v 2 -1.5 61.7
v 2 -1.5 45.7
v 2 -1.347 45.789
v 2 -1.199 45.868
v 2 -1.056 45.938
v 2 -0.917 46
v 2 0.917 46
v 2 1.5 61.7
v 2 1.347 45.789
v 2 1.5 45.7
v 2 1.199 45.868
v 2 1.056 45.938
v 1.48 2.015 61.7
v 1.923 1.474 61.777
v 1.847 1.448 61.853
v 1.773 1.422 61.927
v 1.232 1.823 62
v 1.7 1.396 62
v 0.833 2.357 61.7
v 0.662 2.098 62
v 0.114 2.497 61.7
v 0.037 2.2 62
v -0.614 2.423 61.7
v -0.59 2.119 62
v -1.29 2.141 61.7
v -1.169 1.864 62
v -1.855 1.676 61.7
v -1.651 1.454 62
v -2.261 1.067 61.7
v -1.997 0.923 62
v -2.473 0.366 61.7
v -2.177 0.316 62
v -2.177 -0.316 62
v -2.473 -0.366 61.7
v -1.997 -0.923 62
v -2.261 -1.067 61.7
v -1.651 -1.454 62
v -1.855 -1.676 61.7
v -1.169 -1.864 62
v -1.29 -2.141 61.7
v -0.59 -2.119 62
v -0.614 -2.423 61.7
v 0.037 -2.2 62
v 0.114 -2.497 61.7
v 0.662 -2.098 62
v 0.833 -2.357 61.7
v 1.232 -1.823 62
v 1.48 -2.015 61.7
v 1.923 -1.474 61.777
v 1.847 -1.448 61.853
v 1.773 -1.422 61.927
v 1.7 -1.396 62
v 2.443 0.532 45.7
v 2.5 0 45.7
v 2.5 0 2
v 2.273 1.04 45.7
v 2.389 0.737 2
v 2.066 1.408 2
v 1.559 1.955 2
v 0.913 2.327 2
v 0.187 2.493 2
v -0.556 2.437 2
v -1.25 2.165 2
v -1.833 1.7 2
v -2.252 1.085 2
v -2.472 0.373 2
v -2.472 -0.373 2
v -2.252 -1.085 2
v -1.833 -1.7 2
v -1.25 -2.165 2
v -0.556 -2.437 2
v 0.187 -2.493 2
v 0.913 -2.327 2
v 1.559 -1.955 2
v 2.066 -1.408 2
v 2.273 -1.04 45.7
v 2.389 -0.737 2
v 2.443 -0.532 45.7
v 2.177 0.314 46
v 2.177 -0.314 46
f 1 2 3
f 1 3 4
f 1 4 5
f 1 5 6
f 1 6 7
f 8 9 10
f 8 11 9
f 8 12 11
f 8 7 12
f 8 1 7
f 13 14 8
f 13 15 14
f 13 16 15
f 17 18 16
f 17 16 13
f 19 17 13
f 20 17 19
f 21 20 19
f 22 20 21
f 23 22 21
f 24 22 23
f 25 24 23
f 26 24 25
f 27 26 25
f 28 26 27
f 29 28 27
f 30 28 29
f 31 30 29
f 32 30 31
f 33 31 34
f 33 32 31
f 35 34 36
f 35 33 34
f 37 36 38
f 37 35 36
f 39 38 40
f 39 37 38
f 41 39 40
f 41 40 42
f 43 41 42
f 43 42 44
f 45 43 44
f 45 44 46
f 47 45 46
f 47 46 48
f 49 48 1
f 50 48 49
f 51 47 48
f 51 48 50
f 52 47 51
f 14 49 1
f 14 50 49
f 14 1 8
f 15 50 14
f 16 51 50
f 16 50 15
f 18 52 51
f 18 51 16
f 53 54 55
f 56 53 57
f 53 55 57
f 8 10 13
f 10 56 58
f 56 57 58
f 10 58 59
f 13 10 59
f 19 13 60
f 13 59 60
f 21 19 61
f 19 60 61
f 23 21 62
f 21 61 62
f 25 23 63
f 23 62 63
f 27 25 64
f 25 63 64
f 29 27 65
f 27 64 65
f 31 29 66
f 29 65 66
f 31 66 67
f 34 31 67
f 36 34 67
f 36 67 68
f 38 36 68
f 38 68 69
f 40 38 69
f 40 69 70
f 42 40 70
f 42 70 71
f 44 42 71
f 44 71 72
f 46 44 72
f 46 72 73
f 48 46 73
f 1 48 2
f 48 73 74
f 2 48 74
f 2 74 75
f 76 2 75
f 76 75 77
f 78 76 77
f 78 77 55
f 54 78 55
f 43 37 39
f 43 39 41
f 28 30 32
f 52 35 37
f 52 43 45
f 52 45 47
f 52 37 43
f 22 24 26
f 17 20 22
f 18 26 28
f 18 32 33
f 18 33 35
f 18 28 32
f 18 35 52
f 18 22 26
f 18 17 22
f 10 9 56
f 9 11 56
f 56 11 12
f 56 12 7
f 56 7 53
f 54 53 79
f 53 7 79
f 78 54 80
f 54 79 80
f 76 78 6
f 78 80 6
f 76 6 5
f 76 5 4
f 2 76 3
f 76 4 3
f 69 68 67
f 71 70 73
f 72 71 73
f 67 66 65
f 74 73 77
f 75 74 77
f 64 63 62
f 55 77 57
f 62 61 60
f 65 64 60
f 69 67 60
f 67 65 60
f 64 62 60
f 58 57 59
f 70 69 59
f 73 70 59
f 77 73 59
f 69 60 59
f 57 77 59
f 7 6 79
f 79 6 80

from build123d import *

# Parameters (mm, degrees)
SKETCH070_R     = 2.5
PAD030_DEPTH    = 60
SKETCH066_W     = 4
SKETCH066_H     = 4
POCKET022_DEPTH = 16
CHAMFER016_SIZE = 0.3


with BuildPart() as part:
    # Sketch070 → Pad030 (new body)
    with BuildSketch(Plane.XY):
        Circle(SKETCH070_R)
    extrude(amount=PAD030_DEPTH)

    # Sketch066 (on Face3 of Pad030) → Pocket022 (cut)
    with BuildSketch(Plane.XY.offset(60)):
        with Locations((4, 0)):
            Rectangle(SKETCH066_W, SKETCH066_H)
    extrude(amount=-POCKET022_DEPTH, mode=Mode.SUBTRACT)

    # Chamfer016
    chamfer016_edges = [part.edges().sort_by_distance(p)[0] for p in [
        (2.371708, -0.790569, 44),
        (-2.5, 0, 60),
        (2, 0, 60),
    ]]
    chamfer(chamfer016_edges, length=CHAMFER016_SIZE)


with BuildPart() as part_1:
    # Body019 placement: moved
    add(part.part.moved(Location((0, 0, 2))))


solid = part_1.part
